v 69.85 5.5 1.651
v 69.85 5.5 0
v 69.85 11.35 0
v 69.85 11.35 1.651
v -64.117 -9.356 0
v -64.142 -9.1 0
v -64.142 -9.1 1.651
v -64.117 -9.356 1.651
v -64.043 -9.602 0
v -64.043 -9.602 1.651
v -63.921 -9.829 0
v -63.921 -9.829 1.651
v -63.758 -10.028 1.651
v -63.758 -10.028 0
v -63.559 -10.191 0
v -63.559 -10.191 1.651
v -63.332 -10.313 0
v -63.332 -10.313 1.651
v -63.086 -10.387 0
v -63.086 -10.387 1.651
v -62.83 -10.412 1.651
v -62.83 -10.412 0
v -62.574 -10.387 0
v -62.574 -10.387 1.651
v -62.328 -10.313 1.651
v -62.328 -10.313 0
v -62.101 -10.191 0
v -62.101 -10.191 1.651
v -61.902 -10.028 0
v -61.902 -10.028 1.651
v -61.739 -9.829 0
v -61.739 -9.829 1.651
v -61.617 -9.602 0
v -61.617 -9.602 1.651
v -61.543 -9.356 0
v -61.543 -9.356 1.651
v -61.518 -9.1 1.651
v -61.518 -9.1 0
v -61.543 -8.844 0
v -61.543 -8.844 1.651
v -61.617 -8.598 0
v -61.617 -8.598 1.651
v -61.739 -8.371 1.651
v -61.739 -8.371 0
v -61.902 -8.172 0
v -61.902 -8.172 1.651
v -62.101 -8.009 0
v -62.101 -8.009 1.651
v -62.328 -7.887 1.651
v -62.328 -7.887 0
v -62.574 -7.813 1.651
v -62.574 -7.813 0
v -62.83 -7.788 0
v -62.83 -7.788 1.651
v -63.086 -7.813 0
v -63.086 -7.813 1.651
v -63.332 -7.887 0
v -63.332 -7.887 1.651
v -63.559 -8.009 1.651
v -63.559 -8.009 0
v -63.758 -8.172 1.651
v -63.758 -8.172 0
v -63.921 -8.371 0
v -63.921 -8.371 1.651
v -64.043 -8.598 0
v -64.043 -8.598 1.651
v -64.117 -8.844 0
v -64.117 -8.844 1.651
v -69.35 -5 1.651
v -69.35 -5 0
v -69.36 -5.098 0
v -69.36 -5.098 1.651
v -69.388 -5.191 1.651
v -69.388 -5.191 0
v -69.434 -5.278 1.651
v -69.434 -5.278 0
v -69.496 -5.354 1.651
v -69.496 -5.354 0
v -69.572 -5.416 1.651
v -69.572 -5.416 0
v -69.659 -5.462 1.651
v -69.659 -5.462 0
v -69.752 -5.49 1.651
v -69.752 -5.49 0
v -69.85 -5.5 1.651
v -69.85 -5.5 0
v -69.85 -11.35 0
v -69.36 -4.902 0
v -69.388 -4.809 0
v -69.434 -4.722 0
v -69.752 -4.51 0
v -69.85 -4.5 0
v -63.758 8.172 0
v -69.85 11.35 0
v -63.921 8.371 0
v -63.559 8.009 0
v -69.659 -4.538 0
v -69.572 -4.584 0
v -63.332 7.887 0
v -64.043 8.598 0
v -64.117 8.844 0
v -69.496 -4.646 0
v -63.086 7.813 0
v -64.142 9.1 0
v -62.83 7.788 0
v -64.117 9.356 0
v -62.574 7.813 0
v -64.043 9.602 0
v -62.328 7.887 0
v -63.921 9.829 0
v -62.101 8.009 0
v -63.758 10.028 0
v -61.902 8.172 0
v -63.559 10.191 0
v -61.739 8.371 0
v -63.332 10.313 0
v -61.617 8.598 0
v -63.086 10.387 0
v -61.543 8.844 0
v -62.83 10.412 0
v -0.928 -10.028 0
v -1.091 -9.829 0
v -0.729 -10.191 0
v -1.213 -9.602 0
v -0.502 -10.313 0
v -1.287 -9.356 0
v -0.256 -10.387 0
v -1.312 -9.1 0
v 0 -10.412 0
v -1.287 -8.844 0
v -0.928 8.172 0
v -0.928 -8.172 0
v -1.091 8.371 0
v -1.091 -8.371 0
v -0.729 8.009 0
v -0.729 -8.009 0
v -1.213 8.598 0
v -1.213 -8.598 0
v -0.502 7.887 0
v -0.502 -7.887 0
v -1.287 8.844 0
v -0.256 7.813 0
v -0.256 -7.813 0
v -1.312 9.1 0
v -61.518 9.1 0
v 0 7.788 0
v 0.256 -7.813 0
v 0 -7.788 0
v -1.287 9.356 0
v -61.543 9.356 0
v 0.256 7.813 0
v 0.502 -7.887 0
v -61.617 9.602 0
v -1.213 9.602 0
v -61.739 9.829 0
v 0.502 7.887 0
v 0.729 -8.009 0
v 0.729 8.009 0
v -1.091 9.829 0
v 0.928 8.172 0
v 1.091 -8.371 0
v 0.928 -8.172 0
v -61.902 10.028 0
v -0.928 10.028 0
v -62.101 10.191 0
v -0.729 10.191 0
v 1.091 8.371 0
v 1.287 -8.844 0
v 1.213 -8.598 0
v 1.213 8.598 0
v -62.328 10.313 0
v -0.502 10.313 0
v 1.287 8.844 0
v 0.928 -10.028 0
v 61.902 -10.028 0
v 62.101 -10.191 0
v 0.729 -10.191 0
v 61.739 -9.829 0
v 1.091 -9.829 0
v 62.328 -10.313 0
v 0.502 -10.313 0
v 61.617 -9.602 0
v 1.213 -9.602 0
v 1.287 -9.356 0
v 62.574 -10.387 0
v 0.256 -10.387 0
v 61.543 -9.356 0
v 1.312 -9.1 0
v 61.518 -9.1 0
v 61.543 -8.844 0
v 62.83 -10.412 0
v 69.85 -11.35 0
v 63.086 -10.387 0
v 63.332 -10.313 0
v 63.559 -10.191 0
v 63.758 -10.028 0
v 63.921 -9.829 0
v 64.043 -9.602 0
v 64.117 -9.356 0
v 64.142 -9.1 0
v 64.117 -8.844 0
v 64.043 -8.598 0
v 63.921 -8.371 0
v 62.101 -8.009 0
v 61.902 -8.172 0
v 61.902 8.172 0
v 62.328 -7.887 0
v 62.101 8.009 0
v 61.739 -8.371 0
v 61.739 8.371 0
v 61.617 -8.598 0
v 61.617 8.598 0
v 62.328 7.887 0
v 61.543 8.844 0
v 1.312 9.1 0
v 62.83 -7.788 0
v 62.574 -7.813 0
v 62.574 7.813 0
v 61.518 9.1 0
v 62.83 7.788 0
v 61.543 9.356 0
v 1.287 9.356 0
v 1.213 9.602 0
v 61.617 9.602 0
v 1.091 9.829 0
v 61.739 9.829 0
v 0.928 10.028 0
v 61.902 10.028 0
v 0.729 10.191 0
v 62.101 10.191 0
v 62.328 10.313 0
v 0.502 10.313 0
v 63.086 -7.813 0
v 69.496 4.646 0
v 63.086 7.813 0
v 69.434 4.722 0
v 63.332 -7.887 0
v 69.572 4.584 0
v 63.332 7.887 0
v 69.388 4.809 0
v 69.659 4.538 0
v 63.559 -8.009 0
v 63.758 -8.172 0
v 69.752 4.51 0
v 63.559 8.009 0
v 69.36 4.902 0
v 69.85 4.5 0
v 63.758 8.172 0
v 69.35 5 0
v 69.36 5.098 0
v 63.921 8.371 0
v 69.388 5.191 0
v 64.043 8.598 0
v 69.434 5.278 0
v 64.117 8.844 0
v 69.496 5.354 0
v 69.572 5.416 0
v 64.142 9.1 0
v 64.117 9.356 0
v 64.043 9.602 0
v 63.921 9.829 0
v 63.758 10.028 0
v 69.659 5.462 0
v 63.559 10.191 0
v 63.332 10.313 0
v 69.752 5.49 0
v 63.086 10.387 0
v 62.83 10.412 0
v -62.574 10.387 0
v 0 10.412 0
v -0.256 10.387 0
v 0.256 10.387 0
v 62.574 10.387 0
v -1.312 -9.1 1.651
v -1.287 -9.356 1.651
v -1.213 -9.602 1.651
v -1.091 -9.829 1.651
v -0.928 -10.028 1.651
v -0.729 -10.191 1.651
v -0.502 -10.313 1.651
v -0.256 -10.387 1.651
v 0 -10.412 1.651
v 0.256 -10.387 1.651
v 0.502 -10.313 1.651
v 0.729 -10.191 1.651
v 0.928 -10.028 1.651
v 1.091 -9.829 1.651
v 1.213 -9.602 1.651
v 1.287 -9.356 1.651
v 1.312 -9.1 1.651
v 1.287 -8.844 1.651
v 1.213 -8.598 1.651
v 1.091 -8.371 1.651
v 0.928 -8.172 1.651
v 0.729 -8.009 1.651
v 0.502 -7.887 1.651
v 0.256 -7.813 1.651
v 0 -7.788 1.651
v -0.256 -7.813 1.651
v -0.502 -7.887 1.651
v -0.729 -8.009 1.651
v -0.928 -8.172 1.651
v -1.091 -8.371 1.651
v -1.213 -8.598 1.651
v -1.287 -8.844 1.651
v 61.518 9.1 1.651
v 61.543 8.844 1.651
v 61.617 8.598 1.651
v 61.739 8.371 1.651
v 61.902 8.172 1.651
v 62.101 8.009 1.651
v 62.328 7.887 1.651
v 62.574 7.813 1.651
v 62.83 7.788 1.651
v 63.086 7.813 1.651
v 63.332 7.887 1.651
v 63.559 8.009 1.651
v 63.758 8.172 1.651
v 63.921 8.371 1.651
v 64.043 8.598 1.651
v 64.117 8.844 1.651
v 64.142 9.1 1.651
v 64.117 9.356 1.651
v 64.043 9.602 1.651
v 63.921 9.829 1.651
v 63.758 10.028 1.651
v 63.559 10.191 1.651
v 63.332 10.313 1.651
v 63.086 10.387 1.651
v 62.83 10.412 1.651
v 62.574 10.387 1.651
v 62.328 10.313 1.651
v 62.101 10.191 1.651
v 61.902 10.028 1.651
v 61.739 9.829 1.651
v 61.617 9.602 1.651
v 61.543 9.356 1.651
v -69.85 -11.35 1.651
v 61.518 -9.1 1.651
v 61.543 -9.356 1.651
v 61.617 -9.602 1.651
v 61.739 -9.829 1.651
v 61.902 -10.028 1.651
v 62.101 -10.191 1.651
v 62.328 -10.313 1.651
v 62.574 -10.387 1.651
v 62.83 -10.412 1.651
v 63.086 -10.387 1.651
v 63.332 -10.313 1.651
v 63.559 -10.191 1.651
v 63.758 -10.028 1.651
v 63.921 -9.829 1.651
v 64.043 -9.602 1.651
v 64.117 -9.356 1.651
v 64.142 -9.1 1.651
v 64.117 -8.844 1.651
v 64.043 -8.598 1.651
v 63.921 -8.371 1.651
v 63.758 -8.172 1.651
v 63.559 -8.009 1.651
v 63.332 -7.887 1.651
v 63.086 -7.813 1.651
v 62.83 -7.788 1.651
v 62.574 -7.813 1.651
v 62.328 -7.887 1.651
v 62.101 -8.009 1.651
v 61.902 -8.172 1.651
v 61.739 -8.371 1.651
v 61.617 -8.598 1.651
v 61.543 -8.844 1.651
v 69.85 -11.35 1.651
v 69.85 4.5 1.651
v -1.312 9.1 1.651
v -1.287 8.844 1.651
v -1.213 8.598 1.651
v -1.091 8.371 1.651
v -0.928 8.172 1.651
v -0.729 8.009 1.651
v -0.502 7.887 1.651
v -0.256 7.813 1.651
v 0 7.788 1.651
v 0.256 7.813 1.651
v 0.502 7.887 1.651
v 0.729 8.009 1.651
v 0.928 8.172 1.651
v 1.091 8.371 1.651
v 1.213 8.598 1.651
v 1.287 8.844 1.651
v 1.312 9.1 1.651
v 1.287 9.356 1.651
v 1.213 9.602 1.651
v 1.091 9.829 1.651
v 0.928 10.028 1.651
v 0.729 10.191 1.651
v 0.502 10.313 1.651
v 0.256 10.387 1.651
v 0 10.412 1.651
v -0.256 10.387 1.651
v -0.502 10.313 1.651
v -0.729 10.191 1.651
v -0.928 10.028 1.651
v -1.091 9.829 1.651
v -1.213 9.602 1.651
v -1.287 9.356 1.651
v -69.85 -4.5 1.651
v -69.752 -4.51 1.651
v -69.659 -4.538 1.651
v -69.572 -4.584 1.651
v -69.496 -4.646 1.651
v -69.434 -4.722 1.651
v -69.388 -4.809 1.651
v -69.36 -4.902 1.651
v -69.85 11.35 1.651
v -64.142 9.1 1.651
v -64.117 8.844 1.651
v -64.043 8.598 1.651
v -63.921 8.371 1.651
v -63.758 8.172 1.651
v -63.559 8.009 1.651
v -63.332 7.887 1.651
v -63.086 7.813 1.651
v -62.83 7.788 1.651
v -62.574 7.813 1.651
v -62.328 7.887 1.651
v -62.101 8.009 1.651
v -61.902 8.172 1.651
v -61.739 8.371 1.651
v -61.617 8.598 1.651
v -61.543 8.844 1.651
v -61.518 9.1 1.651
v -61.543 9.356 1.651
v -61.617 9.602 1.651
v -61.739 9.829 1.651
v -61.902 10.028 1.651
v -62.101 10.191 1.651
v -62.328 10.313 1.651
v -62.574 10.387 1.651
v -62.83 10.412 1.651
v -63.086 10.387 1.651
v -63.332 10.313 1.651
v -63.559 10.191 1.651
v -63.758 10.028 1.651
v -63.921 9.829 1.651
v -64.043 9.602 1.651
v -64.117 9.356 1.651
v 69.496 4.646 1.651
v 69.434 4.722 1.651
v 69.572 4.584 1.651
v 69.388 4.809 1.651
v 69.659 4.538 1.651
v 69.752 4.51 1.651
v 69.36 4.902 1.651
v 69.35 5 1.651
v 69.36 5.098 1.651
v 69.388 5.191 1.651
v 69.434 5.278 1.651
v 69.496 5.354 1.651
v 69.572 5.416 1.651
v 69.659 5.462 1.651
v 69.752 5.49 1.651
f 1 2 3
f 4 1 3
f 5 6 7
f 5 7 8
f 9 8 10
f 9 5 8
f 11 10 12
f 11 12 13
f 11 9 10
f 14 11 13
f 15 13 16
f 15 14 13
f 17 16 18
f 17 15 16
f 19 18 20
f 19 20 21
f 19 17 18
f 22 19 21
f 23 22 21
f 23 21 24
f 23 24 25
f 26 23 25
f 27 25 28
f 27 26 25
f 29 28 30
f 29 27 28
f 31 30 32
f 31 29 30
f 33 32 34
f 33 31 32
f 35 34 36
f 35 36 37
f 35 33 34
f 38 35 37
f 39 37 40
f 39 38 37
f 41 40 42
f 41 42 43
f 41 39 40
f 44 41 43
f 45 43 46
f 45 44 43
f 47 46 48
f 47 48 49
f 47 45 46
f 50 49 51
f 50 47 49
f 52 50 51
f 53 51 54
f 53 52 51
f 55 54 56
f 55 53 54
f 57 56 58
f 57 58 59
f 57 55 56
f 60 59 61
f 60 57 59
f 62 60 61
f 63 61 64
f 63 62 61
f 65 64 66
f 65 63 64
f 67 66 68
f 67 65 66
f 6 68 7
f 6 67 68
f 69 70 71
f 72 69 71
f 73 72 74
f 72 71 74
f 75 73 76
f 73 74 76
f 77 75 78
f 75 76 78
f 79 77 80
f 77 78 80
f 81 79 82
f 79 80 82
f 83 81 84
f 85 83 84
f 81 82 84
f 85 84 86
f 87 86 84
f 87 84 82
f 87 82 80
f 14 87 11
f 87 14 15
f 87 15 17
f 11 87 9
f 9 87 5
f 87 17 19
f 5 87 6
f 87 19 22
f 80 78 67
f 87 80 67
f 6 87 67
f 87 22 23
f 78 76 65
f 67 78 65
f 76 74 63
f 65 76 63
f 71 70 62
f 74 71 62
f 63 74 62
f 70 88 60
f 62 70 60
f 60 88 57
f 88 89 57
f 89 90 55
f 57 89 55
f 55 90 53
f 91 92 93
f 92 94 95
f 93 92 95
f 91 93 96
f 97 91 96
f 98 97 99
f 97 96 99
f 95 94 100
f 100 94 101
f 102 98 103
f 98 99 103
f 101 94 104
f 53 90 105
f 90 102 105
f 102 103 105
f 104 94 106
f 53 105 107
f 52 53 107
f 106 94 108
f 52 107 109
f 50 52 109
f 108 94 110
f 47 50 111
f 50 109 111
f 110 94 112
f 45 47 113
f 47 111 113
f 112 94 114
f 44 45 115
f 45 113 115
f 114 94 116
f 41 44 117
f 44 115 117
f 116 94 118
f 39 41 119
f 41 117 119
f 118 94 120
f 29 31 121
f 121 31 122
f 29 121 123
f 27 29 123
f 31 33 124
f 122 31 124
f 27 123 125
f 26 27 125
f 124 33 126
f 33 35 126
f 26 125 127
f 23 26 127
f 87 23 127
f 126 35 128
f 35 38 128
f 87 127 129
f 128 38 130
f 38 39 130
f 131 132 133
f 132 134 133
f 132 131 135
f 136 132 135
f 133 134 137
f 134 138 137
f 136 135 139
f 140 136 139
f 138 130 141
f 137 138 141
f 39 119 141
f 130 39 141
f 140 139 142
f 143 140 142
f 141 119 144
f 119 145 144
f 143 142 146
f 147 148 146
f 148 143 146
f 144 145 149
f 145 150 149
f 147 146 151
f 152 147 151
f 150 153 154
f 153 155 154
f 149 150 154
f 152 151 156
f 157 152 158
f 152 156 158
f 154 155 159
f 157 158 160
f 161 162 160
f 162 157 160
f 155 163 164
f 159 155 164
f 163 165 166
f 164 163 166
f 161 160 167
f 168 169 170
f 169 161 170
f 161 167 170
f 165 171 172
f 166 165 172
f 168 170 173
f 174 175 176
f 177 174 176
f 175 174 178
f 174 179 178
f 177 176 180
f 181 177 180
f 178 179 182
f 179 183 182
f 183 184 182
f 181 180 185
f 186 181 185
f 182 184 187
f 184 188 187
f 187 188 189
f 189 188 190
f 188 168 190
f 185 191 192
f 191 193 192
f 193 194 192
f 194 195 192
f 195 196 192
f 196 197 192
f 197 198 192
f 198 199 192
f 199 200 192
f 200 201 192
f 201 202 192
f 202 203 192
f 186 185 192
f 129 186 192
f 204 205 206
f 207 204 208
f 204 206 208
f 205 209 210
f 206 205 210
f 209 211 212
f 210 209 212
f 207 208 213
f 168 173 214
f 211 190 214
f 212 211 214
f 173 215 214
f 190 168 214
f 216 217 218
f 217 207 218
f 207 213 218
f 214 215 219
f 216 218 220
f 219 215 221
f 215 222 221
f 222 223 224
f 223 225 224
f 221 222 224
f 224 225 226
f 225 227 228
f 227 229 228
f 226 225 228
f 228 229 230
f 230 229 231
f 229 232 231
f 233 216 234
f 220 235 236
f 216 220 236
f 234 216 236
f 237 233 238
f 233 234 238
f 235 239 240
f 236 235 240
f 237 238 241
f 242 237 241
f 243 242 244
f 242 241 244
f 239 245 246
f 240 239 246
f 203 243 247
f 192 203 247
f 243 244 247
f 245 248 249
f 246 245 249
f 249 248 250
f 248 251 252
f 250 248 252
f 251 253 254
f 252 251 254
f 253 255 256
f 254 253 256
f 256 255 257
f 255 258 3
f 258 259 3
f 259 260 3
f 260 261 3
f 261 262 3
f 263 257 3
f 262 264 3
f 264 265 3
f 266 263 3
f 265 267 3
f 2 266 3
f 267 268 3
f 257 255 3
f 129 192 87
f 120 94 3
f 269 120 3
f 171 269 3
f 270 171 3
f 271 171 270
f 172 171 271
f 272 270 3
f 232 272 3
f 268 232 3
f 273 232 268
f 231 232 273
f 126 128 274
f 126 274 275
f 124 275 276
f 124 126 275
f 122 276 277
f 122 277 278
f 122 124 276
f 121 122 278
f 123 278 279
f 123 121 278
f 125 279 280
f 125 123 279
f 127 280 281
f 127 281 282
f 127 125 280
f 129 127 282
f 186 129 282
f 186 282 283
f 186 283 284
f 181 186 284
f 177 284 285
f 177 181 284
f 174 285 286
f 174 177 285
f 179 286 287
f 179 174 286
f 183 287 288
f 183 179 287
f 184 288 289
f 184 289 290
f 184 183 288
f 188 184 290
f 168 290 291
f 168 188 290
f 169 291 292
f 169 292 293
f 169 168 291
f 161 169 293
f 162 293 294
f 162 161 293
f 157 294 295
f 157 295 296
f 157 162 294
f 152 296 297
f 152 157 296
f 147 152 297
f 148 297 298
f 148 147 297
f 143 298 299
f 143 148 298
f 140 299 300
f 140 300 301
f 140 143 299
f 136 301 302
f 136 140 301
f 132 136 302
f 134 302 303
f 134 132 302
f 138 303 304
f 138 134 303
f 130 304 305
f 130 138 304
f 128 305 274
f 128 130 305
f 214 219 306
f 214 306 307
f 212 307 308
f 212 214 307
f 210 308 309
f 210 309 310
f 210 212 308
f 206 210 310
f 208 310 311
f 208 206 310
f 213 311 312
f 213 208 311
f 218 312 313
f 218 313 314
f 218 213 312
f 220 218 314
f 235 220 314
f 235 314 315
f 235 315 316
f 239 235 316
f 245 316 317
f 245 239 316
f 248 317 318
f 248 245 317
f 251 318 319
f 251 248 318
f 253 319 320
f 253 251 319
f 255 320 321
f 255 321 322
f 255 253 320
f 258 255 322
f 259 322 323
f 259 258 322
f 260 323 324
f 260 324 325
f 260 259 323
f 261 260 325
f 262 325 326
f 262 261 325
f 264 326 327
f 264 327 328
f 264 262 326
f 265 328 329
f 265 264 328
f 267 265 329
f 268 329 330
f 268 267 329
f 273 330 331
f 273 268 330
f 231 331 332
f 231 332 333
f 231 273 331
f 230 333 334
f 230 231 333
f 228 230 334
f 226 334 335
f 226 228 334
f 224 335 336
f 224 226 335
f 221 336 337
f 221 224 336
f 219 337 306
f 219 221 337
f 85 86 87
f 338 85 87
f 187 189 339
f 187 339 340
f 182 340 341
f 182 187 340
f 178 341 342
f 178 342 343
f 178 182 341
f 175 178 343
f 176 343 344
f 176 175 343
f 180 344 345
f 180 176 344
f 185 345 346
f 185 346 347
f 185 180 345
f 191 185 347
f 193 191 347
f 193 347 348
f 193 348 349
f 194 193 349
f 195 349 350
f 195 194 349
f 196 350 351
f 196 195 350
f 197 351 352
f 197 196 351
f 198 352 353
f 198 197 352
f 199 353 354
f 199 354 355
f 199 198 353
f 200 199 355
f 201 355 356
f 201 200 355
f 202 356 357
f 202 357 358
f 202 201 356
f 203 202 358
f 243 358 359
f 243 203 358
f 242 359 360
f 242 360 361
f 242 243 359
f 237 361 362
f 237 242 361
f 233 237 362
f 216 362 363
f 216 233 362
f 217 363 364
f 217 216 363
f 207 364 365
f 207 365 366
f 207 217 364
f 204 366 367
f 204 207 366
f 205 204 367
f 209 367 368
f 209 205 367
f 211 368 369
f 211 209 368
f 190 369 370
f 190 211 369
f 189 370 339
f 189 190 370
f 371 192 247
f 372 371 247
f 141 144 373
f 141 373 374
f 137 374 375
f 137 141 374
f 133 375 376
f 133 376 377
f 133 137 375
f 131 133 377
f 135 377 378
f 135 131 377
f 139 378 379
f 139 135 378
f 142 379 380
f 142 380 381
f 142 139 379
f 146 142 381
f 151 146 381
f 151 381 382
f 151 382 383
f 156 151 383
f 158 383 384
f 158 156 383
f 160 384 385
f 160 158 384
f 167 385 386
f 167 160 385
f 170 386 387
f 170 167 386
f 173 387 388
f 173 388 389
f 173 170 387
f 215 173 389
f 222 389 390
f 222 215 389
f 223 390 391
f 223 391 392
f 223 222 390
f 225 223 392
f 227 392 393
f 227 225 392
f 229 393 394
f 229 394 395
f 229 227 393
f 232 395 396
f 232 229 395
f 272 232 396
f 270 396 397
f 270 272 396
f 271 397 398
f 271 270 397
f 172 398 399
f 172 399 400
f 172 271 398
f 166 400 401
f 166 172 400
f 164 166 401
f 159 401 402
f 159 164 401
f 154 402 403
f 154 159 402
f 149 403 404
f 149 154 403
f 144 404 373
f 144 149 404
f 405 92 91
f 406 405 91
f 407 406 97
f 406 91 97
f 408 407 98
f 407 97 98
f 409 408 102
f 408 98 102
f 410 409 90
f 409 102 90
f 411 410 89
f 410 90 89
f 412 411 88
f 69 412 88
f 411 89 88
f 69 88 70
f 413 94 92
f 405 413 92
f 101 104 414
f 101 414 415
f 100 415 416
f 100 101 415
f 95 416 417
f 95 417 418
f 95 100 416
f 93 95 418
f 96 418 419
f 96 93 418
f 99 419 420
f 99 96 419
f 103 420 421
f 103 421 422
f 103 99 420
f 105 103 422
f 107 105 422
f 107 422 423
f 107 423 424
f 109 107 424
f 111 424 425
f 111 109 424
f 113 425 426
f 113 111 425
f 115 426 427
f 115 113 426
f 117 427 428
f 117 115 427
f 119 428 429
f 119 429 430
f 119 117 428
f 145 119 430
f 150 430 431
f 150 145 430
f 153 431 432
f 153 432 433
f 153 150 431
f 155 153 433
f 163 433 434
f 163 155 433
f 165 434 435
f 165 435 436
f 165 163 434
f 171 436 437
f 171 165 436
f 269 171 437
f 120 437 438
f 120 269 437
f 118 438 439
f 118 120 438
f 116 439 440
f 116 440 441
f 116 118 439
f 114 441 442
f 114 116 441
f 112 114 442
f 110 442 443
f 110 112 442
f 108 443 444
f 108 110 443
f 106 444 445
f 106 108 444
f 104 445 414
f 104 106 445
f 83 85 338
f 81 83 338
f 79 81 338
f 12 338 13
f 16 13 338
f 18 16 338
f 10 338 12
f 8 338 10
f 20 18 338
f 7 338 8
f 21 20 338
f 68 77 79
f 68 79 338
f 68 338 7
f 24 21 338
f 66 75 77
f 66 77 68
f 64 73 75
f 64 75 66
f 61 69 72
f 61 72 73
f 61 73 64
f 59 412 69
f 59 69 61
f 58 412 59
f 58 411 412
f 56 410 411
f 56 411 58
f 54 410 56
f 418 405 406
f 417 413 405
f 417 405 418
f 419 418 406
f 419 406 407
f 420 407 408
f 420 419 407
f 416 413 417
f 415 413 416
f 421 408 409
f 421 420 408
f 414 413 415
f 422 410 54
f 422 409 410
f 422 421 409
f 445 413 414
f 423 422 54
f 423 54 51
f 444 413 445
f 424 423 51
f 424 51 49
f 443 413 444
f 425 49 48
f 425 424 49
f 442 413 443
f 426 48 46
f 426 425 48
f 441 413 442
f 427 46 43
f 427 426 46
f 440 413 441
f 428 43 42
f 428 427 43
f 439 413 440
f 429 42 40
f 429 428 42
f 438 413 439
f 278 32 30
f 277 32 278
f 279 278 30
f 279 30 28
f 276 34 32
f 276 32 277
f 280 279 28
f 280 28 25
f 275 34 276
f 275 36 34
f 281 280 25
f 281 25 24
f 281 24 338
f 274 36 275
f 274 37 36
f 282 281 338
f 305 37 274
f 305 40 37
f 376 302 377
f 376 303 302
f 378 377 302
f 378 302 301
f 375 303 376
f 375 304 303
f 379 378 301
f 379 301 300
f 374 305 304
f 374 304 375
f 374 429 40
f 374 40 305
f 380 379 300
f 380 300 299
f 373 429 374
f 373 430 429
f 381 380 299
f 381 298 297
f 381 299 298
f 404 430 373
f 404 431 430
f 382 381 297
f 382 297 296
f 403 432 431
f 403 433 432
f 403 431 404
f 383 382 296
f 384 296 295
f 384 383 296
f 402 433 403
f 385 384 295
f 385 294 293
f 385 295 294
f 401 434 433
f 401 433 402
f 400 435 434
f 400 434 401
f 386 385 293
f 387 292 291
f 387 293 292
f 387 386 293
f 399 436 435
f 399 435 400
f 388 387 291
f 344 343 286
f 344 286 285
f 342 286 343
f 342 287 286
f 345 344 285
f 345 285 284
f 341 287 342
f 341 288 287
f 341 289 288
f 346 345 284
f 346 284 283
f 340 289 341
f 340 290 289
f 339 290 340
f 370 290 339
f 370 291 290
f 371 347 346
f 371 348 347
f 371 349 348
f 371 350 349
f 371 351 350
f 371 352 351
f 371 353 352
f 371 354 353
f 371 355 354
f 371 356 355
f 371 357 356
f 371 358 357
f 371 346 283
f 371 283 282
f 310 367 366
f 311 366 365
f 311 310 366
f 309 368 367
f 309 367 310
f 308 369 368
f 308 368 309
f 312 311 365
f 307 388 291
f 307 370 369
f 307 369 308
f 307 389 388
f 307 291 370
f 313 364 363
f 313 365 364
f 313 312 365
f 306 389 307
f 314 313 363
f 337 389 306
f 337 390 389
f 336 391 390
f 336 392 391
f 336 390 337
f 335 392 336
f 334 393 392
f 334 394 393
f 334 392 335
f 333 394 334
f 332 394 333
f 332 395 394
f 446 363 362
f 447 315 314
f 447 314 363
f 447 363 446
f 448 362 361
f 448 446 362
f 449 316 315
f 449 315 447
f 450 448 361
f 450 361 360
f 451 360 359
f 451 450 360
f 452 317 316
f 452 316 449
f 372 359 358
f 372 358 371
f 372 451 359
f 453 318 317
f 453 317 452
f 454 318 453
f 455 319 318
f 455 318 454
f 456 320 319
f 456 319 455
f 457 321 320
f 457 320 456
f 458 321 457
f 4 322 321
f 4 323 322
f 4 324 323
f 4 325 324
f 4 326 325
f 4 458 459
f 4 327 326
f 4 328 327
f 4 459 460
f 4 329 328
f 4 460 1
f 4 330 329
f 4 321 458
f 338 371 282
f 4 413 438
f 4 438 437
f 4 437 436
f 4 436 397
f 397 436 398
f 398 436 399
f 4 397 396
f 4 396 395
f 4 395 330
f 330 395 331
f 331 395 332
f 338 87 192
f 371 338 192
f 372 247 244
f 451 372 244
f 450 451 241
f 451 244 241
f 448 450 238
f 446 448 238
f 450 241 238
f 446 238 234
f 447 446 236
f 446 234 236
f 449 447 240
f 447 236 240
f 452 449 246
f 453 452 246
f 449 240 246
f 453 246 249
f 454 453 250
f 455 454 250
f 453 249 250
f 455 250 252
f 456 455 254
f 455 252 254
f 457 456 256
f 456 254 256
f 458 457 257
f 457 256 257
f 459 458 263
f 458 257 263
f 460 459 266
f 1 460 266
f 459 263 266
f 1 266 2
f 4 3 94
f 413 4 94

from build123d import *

# Parameters (mm, degrees)
SKETCH1_R           = 1.3125
BOSS_EXTRUDE1_DEPTH = 1.651


with BuildPart() as part:
    # Sketch1 → Boss-Extrude1 (new body)
    with BuildSketch(Plane.XY):
        with BuildLine():
            Line((-69.85, -5.5), (-69.85, -11.35))
            Line((-69.85, -11.35), (69.85, -11.35))
            Line((69.85, -11.35), (69.85, 4.5))
            ThreePointArc((69.85, 4.5), (69.35, 5), (69.85, 5.5))
            Line((69.85, 5.5), (69.85, 11.35))
            Line((69.85, 11.35), (-69.85, 11.35))
            Line((-69.85, 11.35), (-69.85, -4.5))
            ThreePointArc((-69.85, -4.5), (-69.496446609, -4.646446609), (-69.35, -5))
            ThreePointArc((-69.35, -5), (-69.496446609, -5.353553391), (-69.85, -5.5))
        make_face()
        with Locations(Location((-62.83, -9.1, 0), (0, 0, 180))):
            Circle(SKETCH1_R, mode=Mode.SUBTRACT)
        with Locations(Location((0, -9.1, 0), (0, 0, 180))):
            Circle(SKETCH1_R, mode=Mode.SUBTRACT)
        with Locations(Location((62.83, -9.1, 0), (0, 0, 180))):
            Circle(SKETCH1_R, mode=Mode.SUBTRACT)
        with Locations(Location((-62.83, 9.1, 0), (0, 0, 180))):
            Circle(SKETCH1_R, mode=Mode.SUBTRACT)
        with Locations(Location((0, 9.1, 0), (0, 0, 180))):
            Circle(SKETCH1_R, mode=Mode.SUBTRACT)
        with Locations(Location((62.83, 9.1, 0), (0, 0, 180))):
            Circle(SKETCH1_R, mode=Mode.SUBTRACT)
    extrude(amount=BOSS_EXTRUDE1_DEPTH)


solid = part.part
